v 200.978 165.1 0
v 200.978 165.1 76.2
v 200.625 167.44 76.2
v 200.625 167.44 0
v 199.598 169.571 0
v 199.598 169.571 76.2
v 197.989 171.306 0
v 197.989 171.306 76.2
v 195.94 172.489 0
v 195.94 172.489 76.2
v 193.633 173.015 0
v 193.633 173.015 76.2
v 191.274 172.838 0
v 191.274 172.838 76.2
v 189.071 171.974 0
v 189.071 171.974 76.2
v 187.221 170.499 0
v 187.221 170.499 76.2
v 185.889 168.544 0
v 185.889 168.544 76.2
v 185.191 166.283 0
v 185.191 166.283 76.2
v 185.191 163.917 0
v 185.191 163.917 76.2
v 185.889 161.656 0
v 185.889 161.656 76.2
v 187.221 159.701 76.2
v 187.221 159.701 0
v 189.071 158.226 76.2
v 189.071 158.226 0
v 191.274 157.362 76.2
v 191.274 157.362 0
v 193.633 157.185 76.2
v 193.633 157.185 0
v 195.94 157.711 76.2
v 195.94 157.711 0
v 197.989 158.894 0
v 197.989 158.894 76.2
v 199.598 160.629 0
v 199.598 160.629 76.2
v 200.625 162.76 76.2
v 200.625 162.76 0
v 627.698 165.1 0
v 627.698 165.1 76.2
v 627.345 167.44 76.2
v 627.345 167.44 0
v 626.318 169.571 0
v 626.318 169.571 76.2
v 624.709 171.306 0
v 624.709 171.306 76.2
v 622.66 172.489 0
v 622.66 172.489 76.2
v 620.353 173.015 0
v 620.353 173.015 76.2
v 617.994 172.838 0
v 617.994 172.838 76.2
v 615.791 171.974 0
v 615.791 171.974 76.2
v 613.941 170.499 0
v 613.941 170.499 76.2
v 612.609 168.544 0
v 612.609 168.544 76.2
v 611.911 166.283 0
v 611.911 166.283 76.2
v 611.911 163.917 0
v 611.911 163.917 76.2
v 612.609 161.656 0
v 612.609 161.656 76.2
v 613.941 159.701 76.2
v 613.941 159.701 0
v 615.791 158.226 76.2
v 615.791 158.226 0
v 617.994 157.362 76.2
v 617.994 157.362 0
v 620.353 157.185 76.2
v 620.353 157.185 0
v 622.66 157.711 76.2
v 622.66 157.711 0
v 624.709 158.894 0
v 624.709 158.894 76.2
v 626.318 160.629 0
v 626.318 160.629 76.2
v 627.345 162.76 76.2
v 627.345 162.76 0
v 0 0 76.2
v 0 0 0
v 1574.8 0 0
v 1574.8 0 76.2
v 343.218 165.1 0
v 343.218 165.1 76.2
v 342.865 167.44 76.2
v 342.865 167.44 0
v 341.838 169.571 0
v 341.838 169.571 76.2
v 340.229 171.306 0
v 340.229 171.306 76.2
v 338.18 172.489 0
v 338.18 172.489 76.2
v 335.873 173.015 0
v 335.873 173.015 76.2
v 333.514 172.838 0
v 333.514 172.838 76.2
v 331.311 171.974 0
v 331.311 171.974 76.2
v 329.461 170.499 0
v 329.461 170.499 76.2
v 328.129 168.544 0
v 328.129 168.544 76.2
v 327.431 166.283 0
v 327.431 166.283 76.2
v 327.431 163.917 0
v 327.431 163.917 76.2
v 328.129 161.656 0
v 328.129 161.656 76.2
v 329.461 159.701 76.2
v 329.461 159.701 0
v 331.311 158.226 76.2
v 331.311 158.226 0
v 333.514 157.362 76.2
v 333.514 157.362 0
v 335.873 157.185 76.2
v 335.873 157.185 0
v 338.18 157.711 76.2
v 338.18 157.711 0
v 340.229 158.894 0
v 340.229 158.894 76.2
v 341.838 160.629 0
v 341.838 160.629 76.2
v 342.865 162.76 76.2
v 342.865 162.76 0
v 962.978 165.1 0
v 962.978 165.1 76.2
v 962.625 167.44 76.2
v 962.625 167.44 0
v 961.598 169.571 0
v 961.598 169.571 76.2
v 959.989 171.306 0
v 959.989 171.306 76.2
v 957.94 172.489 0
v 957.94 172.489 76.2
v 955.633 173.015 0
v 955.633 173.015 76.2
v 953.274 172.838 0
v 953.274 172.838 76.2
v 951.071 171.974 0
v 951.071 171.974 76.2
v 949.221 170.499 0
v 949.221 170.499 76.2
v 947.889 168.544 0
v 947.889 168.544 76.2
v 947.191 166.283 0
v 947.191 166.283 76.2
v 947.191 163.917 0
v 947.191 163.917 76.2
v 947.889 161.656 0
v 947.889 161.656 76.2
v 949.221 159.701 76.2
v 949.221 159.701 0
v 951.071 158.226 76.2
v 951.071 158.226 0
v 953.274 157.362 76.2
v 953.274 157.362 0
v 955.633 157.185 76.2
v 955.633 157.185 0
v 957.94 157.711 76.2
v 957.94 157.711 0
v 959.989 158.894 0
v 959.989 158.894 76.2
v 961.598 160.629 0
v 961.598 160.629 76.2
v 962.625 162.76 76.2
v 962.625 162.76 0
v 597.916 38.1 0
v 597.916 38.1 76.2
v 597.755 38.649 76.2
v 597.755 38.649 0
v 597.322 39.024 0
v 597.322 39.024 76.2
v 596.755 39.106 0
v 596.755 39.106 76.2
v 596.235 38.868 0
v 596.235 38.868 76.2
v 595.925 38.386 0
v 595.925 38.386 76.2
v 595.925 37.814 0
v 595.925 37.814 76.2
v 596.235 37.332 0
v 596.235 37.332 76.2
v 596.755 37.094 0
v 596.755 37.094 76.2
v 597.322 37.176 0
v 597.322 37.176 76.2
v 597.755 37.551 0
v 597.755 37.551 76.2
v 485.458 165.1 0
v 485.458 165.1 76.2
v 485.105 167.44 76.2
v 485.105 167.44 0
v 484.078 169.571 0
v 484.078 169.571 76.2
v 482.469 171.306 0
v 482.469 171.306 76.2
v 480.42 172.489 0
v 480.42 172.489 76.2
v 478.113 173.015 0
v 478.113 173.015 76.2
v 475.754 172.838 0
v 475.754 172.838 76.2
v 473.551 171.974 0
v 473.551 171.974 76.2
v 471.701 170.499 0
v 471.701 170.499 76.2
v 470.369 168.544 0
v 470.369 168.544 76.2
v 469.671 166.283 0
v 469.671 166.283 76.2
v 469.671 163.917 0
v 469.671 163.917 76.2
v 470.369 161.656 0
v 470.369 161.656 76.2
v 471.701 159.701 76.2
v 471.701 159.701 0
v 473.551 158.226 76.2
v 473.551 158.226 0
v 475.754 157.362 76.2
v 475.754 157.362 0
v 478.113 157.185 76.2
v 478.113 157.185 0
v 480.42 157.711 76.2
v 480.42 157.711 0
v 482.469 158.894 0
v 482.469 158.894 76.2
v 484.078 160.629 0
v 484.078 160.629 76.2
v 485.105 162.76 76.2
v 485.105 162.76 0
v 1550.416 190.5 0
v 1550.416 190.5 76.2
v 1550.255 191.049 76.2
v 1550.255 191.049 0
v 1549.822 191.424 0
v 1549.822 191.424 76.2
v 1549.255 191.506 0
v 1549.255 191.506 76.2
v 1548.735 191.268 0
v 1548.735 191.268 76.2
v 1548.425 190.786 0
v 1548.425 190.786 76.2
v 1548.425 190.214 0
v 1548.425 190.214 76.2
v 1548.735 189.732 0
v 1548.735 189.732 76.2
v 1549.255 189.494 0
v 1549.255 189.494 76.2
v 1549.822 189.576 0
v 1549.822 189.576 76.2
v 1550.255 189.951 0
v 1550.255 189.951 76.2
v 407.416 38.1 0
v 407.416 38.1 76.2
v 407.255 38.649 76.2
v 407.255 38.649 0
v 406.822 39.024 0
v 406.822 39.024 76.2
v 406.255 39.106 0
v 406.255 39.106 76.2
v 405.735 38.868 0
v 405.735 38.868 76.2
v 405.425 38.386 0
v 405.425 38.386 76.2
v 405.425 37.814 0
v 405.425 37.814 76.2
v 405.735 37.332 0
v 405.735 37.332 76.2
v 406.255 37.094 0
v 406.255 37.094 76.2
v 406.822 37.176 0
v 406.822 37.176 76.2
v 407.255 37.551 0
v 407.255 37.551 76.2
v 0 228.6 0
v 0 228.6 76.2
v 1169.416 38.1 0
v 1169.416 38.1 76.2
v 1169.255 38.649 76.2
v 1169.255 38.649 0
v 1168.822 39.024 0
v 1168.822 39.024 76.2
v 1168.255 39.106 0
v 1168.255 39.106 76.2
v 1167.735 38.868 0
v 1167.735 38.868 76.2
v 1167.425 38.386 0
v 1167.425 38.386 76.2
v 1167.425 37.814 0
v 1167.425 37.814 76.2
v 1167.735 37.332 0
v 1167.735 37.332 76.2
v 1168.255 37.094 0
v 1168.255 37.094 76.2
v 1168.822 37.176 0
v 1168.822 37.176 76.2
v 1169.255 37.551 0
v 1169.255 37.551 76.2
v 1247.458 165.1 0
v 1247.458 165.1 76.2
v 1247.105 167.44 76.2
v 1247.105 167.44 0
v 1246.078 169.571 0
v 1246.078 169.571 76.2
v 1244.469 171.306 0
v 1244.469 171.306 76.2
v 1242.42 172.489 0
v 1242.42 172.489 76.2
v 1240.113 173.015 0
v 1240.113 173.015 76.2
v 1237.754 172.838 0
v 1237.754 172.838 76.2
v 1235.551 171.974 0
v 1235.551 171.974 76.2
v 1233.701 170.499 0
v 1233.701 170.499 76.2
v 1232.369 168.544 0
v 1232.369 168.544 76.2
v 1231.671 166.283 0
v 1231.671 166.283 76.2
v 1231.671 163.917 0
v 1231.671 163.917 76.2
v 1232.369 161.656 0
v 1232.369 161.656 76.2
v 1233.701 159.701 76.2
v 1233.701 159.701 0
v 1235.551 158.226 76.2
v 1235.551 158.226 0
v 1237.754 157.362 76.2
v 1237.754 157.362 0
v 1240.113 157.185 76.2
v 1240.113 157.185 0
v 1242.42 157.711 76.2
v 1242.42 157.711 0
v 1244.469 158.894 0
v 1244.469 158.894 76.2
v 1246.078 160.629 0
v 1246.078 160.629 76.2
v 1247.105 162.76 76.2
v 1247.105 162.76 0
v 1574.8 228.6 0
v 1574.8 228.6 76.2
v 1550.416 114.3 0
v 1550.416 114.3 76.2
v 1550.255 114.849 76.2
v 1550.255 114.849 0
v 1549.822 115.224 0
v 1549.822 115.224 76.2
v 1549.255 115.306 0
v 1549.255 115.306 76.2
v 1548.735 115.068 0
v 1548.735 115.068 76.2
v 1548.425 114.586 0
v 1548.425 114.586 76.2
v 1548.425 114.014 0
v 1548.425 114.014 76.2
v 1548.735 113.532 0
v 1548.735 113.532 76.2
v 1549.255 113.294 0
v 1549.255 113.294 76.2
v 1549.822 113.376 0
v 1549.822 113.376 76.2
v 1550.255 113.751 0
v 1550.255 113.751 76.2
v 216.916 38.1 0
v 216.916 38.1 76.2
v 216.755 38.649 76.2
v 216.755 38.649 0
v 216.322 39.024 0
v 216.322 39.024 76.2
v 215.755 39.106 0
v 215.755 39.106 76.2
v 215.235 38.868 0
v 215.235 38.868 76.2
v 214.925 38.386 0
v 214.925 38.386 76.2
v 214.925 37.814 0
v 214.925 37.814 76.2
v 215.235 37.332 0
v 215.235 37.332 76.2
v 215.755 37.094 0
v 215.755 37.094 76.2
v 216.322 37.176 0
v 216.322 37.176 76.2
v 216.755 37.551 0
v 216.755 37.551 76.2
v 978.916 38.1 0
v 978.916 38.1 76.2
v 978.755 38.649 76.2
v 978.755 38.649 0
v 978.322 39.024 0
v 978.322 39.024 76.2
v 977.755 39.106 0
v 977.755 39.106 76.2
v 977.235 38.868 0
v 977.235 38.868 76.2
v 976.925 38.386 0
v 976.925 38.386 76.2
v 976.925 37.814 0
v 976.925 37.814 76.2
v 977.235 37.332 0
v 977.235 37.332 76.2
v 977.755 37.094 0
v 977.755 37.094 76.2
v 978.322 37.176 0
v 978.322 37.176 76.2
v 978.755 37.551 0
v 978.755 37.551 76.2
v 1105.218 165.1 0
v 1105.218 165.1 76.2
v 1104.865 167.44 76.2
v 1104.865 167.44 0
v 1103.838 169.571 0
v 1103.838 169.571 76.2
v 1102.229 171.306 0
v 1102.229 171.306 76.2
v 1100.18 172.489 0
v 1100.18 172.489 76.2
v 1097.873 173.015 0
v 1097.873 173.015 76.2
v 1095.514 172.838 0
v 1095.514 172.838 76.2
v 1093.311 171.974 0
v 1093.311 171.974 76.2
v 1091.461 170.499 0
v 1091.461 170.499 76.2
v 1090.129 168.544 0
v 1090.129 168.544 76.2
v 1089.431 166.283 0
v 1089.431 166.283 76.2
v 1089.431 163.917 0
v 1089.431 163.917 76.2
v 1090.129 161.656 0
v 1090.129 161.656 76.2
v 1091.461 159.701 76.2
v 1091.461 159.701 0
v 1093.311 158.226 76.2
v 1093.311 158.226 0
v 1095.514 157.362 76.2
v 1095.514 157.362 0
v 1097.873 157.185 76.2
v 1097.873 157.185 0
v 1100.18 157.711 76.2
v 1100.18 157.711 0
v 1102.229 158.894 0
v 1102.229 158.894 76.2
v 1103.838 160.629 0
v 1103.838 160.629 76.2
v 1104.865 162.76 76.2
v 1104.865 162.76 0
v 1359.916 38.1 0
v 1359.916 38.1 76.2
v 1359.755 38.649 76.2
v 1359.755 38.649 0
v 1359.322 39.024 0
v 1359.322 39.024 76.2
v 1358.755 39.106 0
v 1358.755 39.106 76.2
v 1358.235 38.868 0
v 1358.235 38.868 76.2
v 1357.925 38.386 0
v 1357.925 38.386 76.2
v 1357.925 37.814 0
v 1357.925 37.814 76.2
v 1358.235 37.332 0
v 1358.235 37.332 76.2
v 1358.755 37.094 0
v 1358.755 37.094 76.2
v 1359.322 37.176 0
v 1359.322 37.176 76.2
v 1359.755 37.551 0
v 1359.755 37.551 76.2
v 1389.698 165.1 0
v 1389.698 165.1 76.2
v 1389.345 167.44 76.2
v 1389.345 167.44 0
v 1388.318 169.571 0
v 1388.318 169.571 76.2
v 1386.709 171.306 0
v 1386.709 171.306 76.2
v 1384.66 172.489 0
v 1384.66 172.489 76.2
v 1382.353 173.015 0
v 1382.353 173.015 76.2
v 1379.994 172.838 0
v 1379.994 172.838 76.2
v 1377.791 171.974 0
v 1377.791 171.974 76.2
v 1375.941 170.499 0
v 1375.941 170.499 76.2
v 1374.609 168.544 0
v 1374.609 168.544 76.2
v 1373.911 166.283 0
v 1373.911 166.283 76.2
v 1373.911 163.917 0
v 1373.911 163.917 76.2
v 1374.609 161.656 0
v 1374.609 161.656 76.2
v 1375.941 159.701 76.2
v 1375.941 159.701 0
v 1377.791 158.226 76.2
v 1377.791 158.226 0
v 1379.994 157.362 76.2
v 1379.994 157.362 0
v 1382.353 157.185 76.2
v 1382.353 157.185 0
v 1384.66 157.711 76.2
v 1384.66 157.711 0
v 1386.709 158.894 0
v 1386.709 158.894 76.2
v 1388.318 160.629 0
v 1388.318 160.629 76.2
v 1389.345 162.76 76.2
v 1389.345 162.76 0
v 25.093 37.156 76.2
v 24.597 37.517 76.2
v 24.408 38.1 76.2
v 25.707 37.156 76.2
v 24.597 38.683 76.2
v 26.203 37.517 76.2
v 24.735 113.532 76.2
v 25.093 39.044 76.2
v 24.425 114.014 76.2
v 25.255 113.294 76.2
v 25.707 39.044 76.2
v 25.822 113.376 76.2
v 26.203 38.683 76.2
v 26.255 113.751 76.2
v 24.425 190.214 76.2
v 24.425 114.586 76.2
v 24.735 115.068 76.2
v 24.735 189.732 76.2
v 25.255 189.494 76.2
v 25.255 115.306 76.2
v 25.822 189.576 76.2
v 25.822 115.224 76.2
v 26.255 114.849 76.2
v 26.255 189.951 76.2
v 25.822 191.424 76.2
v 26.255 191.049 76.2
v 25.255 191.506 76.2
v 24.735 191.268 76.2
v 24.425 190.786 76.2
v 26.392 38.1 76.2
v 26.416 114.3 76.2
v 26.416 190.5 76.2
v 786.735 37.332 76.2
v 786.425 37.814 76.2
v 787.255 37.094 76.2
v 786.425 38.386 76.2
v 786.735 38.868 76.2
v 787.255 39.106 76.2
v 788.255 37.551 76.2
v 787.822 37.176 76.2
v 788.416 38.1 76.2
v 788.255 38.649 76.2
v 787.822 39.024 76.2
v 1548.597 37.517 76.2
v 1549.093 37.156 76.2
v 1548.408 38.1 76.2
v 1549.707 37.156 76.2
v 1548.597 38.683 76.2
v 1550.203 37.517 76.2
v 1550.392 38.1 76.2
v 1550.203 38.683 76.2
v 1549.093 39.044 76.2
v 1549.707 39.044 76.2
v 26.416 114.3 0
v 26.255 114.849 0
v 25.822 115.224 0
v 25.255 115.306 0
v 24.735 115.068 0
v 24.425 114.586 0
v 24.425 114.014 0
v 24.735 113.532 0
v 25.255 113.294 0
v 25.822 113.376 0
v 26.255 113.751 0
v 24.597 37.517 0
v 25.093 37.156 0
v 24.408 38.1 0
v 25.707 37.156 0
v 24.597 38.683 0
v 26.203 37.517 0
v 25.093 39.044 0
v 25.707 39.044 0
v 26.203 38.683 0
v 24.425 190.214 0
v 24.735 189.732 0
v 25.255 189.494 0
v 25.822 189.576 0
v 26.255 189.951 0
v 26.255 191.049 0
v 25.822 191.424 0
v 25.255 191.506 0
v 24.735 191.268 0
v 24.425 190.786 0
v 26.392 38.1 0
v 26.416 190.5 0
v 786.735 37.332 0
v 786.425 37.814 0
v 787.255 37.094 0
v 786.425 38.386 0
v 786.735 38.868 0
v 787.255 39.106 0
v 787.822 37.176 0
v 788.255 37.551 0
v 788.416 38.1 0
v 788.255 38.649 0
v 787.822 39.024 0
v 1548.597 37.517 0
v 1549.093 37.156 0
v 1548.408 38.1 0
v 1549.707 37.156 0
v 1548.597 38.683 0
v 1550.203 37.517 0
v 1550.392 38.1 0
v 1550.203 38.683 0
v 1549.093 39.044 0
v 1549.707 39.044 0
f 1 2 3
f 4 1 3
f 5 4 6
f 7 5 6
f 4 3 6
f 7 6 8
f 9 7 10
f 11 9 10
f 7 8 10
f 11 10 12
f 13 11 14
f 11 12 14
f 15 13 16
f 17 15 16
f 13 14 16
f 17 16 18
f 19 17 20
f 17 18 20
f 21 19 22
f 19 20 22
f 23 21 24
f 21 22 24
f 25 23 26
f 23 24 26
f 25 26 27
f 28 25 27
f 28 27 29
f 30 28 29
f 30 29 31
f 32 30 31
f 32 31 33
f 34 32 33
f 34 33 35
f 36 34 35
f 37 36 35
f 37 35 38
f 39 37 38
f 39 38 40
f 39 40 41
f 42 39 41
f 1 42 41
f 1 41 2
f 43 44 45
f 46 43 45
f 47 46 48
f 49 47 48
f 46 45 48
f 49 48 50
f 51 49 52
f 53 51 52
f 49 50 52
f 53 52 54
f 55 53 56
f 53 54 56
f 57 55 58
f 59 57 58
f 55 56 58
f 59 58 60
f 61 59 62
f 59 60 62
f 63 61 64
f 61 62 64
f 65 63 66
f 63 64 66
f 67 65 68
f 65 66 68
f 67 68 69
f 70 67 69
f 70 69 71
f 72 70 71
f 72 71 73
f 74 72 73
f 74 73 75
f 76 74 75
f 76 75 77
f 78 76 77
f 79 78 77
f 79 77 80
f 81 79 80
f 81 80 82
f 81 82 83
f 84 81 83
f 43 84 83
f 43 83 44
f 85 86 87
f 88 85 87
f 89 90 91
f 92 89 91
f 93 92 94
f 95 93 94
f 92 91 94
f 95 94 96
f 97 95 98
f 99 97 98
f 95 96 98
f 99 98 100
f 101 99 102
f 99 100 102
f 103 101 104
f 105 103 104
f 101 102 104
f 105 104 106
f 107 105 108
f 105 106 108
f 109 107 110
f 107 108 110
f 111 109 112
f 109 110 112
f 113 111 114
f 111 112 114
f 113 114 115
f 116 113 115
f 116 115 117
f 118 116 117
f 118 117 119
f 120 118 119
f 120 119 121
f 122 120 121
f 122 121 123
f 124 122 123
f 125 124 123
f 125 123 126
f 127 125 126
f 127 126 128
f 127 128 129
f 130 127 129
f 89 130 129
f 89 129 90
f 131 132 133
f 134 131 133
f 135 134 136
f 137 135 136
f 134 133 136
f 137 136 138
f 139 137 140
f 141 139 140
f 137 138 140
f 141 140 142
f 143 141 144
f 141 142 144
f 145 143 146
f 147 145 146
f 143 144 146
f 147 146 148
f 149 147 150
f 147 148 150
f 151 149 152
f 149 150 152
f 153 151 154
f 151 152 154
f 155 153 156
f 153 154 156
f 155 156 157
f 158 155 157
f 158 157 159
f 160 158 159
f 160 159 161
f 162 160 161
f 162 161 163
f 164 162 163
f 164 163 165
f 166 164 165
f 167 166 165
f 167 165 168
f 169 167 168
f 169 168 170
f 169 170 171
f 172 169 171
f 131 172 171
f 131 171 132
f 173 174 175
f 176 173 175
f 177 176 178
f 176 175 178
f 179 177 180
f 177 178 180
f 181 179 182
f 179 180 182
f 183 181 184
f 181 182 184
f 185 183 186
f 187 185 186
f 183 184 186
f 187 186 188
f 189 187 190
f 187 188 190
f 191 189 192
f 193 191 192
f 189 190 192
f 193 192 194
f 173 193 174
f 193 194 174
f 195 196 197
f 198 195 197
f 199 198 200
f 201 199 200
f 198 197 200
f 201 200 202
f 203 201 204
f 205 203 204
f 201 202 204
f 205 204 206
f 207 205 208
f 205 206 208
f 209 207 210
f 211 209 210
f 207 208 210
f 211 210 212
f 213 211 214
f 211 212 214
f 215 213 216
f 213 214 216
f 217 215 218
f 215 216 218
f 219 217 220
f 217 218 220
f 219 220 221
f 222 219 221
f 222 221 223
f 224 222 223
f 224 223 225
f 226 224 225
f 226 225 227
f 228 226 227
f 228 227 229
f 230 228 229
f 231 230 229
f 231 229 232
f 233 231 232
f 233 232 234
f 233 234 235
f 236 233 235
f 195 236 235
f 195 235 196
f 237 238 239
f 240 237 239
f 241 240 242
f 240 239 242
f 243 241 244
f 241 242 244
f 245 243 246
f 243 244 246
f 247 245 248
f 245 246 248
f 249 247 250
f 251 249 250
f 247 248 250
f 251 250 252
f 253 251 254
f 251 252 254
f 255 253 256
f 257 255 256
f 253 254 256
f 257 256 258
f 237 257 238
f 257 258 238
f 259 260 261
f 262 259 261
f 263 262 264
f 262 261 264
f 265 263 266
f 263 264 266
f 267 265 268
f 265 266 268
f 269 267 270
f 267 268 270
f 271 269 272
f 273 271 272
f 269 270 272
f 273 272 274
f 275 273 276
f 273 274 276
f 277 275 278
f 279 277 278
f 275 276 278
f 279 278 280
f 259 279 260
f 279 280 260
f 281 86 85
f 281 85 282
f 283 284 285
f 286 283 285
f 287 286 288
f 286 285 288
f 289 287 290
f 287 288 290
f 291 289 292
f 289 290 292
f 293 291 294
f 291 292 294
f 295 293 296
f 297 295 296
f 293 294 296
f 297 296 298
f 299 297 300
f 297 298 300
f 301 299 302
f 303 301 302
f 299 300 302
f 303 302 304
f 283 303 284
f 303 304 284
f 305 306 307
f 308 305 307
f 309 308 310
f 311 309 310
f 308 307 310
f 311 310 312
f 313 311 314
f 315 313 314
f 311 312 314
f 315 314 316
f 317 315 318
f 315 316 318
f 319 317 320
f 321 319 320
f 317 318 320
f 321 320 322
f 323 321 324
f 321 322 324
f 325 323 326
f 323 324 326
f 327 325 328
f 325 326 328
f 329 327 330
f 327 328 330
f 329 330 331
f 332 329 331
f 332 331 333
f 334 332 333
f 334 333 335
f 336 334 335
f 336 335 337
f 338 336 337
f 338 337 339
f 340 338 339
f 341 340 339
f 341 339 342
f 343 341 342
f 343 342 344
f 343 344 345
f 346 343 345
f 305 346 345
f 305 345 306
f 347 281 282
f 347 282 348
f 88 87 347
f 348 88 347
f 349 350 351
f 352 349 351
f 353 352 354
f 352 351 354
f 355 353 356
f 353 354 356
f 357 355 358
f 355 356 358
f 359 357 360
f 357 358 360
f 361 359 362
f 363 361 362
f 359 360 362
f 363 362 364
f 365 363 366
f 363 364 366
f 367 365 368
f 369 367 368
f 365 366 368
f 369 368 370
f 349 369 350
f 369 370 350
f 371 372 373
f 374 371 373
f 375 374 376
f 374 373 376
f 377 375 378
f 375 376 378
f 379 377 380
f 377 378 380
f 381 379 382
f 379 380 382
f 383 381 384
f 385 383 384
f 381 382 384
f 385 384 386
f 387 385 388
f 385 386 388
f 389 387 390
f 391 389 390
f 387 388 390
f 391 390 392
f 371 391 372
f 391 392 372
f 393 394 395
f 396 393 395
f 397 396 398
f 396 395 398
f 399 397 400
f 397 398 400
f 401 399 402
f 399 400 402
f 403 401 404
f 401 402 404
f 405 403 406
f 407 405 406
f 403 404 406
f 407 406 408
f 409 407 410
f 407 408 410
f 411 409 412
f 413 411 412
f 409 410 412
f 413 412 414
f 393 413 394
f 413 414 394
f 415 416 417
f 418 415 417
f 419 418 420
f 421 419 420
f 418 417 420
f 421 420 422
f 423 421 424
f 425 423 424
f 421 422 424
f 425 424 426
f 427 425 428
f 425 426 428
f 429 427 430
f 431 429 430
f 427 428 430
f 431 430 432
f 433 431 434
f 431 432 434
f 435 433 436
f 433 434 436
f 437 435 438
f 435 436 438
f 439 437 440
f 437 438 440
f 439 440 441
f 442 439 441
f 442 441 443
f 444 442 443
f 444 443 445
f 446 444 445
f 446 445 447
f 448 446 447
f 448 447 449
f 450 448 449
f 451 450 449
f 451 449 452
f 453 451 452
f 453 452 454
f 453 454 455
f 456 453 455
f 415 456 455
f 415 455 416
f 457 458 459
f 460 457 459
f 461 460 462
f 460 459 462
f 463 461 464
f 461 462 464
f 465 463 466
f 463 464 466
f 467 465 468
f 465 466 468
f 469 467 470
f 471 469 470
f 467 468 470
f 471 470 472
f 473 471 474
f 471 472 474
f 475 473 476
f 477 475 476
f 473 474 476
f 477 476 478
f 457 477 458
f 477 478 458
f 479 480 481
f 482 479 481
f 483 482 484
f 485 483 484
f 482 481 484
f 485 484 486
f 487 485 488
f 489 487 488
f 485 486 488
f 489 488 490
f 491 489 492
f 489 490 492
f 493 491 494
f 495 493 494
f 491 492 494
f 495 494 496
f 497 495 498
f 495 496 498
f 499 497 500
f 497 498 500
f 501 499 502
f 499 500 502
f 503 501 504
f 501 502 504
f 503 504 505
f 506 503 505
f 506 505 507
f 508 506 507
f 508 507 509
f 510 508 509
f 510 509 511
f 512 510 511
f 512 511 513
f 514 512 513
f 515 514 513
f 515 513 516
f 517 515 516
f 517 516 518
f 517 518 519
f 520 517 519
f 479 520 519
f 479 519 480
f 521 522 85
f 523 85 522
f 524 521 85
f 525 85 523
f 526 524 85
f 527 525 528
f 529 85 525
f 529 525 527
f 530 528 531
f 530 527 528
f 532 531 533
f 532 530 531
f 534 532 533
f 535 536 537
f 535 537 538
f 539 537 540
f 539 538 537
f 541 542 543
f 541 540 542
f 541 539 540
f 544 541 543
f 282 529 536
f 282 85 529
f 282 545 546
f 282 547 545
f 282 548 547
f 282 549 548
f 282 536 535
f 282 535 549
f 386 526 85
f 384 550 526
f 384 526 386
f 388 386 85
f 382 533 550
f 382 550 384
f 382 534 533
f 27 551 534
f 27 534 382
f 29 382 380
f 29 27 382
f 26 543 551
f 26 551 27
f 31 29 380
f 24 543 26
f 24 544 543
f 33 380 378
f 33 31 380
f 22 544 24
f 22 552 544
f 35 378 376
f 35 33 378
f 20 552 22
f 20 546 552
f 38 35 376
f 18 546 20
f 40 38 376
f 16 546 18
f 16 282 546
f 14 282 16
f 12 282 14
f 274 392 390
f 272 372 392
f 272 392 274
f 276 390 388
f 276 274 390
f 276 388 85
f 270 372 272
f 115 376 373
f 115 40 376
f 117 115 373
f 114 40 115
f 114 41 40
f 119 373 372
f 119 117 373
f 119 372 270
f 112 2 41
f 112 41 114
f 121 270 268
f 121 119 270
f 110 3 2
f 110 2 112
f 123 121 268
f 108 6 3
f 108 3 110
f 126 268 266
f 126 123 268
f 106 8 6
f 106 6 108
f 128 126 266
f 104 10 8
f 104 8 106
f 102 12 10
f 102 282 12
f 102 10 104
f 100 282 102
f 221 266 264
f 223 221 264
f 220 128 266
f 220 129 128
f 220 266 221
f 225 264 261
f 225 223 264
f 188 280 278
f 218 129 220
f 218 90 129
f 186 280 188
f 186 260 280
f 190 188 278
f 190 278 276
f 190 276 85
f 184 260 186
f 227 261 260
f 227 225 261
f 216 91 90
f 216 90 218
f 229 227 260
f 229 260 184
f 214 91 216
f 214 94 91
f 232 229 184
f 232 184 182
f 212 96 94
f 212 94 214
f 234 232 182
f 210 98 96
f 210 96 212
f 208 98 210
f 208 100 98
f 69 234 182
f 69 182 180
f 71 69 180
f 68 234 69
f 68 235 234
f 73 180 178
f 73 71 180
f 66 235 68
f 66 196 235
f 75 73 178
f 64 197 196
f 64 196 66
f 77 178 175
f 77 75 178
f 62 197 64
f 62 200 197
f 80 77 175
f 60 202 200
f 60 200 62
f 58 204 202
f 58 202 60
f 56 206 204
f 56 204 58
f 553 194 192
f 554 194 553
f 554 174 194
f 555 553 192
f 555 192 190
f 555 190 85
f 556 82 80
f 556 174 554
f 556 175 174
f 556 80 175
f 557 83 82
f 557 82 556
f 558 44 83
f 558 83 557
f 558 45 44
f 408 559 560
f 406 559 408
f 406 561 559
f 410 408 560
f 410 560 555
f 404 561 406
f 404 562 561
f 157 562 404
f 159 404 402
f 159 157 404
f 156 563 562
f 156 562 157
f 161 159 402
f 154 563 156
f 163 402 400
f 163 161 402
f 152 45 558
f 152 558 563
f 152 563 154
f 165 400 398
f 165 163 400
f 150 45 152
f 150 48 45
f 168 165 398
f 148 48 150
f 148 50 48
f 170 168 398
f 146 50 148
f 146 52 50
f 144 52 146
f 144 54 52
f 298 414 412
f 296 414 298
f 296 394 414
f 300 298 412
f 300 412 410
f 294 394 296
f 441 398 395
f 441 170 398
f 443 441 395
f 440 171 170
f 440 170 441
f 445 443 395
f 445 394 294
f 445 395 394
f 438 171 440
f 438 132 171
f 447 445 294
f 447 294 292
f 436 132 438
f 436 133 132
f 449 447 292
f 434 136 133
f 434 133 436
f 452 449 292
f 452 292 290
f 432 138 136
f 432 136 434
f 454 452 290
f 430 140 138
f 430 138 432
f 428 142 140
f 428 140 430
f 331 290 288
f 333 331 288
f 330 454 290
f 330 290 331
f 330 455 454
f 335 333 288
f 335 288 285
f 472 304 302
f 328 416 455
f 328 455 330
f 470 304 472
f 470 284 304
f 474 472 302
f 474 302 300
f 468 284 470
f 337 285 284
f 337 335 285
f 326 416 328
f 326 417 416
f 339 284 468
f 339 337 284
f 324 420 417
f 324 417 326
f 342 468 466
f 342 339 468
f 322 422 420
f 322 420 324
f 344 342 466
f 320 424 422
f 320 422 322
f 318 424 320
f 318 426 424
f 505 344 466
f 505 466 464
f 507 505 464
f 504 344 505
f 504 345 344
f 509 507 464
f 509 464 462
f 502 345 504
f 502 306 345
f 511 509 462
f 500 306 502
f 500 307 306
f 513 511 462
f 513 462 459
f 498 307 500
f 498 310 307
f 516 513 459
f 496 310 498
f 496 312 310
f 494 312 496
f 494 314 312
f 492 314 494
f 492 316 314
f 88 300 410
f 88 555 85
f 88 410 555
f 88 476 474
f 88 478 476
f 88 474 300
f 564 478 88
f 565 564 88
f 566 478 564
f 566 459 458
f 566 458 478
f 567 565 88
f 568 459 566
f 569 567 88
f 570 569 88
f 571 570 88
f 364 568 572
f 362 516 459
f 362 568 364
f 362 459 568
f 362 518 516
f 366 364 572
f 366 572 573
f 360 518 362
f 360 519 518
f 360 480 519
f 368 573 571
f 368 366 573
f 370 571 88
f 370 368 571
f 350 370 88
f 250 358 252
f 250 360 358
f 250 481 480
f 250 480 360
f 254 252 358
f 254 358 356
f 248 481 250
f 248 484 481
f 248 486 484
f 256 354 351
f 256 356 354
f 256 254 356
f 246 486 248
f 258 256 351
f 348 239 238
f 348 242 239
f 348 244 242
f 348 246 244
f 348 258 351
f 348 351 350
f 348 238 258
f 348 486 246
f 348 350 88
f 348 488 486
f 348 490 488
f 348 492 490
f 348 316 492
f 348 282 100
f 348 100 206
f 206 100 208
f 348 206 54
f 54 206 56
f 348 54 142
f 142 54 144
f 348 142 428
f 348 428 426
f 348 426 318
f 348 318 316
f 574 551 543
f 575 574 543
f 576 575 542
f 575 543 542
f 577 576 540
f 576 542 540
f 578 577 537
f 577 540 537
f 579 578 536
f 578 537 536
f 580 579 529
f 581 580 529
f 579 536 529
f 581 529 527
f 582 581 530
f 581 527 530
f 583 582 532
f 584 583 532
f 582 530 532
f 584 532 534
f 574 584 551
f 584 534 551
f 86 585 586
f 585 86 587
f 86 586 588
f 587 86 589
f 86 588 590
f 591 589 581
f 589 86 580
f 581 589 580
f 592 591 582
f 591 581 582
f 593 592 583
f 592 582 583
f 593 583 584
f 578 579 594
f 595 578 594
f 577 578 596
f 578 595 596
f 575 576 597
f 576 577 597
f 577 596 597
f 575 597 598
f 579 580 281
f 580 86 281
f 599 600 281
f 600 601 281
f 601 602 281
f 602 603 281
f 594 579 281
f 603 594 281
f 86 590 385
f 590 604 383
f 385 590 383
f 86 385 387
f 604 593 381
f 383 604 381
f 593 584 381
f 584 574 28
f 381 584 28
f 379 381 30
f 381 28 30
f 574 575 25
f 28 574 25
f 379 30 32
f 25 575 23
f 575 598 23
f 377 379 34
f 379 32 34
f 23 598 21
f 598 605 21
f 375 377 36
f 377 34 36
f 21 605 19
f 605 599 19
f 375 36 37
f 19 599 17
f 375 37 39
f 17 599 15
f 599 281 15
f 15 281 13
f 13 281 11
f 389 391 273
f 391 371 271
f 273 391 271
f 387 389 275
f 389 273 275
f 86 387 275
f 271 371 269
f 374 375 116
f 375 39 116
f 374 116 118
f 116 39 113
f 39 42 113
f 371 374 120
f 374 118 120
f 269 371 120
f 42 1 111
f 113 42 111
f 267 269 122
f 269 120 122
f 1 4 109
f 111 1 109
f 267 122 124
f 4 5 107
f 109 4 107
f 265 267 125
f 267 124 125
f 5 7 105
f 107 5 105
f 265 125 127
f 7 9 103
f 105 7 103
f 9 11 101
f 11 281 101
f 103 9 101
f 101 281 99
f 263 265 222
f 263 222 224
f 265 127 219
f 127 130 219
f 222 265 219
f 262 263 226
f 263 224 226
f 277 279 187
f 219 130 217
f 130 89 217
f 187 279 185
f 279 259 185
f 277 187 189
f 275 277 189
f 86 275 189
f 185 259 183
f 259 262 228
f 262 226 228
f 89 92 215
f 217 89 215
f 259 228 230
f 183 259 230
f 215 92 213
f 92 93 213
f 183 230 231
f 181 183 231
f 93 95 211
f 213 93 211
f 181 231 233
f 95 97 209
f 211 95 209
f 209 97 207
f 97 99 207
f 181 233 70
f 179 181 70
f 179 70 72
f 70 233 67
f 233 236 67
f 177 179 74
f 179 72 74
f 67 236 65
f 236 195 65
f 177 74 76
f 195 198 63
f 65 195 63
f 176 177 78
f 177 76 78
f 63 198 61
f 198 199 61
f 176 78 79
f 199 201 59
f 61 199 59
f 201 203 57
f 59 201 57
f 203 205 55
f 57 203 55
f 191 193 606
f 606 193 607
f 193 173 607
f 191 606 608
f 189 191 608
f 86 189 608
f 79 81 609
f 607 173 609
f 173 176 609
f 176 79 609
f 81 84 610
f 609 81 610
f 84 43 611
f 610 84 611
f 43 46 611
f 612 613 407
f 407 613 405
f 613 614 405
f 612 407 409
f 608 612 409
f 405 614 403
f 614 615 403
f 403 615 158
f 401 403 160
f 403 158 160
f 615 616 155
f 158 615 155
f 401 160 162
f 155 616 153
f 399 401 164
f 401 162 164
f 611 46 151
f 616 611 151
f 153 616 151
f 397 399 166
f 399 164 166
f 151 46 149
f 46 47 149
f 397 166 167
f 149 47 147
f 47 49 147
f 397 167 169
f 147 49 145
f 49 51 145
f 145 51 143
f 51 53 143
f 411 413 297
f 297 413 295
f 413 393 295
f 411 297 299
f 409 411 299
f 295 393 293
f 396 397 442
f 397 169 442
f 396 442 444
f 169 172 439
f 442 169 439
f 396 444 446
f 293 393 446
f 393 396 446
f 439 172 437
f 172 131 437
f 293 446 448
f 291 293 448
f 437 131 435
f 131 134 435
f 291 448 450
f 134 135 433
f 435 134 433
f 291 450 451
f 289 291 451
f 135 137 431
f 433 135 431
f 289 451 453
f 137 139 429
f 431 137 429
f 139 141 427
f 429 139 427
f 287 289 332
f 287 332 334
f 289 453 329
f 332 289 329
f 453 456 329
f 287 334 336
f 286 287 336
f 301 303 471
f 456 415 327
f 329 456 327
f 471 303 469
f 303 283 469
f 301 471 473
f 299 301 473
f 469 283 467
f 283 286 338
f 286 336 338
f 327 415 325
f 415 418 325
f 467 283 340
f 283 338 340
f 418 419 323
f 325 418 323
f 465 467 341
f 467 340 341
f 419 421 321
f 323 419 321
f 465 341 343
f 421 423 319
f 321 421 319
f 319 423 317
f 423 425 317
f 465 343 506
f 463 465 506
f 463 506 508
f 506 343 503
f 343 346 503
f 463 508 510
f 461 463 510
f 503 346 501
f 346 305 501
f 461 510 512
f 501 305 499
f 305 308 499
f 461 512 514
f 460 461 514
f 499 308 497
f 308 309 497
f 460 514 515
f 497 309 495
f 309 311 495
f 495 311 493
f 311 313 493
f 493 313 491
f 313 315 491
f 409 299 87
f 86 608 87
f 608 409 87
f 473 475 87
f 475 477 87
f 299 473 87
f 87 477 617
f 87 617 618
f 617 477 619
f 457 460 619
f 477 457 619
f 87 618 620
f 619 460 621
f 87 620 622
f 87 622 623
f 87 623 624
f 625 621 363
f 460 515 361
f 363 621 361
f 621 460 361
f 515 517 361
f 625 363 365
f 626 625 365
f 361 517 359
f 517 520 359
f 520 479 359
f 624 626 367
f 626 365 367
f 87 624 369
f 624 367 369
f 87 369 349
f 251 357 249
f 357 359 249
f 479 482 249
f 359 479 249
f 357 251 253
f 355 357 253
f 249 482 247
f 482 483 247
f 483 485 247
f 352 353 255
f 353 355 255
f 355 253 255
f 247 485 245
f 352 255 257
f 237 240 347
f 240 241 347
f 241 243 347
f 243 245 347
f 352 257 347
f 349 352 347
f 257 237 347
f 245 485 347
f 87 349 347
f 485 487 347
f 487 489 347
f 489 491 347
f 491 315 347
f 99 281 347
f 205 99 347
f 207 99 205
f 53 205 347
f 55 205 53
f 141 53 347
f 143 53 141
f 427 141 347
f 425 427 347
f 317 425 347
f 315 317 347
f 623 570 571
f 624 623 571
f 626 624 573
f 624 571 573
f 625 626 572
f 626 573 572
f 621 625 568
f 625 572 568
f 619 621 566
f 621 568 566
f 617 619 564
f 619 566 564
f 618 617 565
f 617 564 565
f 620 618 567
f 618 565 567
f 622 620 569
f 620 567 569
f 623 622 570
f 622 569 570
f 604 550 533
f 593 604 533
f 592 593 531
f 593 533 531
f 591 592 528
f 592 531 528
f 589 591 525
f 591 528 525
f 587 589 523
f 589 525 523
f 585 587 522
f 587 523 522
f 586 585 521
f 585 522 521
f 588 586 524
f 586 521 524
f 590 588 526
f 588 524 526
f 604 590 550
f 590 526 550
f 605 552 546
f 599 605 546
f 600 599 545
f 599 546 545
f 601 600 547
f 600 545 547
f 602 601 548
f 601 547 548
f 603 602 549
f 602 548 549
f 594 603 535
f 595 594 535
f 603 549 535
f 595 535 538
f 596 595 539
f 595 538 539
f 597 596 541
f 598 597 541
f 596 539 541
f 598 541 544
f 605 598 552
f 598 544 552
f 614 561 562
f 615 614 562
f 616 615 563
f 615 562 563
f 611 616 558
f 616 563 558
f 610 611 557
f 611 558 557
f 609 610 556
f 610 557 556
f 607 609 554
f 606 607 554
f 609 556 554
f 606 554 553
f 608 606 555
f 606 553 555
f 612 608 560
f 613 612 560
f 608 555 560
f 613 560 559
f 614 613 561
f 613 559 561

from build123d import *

# Parameters (mm, degrees)
SKETCH1_W           = 1574.8
SKETCH1_H           = 228.6
BOSS_EXTRUDE1_DEPTH = 76.2
SKETCH2_R           = 7.9375
CUT_EXTRUDE1_DEPTH  = 1594.128820906
SKETCH3_R           = 0.9921875
SKETCH3_R_2         = 1.016
CUT_EXTRUDE2_DEPTH  = 76.2


with BuildPart() as part:
    # Sketch1 → Boss-Extrude1 (new body)
    with BuildSketch(Plane.XY):
        with Locations((787.4, 114.3)):
            Rectangle(SKETCH1_W, SKETCH1_H)
    extrude(amount=BOSS_EXTRUDE1_DEPTH)

    # Sketch2 → Cut-Extrude1 (cut, through all)
    with BuildSketch(Plane.XY.offset(76.2)):
        with Locations((193.04, 165.1)):
            Circle(SKETCH2_R)
        with Locations((335.28, 165.1)):
            Circle(SKETCH2_R)
        with Locations((477.52, 165.1)):
            Circle(SKETCH2_R)
        with Locations((619.76, 165.1)):
            Circle(SKETCH2_R)
        with Locations((955.04, 165.1)):
            Circle(SKETCH2_R)
        with Locations((1097.28, 165.1)):
            Circle(SKETCH2_R)
        with Locations((1239.52, 165.1)):
            Circle(SKETCH2_R)
        with Locations((1381.76, 165.1)):
            Circle(SKETCH2_R)
    extrude(amount=-CUT_EXTRUDE1_DEPTH, mode=Mode.SUBTRACT)

    # Sketch3 → Cut-Extrude2 (cut)
    with BuildSketch(Plane.XY.offset(76.2)):
        with Locations((1549.4, 38.1)):
            Circle(SKETCH3_R)
        with Locations((1549.4, 190.5)):
            Circle(SKETCH3_R_2)
        with Locations((1549.4, 114.3)):
            Circle(SKETCH3_R_2)
        with Locations((25.4, 38.1)):
            Circle(SKETCH3_R)
        with Locations((25.4, 114.3)):
            Circle(SKETCH3_R_2)
        with Locations((25.4, 190.5)):
            Circle(SKETCH3_R_2)
        with Locations((215.9, 38.1)):
            Circle(SKETCH3_R_2)
        with Locations((406.4, 38.1)):
            Circle(SKETCH3_R_2)
        with Locations((596.9, 38.1)):
            Circle(SKETCH3_R_2)
        with Locations((787.4, 38.1)):
            Circle(SKETCH3_R_2)
        with Locations((977.9, 38.1)):
            Circle(SKETCH3_R_2)
        with Locations((1168.4, 38.1)):
            Circle(SKETCH3_R_2)
        with Locations((1358.9, 38.1)):
            Circle(SKETCH3_R_2)
    extrude(amount=-CUT_EXTRUDE2_DEPTH, mode=Mode.SUBTRACT)


solid = part.part
